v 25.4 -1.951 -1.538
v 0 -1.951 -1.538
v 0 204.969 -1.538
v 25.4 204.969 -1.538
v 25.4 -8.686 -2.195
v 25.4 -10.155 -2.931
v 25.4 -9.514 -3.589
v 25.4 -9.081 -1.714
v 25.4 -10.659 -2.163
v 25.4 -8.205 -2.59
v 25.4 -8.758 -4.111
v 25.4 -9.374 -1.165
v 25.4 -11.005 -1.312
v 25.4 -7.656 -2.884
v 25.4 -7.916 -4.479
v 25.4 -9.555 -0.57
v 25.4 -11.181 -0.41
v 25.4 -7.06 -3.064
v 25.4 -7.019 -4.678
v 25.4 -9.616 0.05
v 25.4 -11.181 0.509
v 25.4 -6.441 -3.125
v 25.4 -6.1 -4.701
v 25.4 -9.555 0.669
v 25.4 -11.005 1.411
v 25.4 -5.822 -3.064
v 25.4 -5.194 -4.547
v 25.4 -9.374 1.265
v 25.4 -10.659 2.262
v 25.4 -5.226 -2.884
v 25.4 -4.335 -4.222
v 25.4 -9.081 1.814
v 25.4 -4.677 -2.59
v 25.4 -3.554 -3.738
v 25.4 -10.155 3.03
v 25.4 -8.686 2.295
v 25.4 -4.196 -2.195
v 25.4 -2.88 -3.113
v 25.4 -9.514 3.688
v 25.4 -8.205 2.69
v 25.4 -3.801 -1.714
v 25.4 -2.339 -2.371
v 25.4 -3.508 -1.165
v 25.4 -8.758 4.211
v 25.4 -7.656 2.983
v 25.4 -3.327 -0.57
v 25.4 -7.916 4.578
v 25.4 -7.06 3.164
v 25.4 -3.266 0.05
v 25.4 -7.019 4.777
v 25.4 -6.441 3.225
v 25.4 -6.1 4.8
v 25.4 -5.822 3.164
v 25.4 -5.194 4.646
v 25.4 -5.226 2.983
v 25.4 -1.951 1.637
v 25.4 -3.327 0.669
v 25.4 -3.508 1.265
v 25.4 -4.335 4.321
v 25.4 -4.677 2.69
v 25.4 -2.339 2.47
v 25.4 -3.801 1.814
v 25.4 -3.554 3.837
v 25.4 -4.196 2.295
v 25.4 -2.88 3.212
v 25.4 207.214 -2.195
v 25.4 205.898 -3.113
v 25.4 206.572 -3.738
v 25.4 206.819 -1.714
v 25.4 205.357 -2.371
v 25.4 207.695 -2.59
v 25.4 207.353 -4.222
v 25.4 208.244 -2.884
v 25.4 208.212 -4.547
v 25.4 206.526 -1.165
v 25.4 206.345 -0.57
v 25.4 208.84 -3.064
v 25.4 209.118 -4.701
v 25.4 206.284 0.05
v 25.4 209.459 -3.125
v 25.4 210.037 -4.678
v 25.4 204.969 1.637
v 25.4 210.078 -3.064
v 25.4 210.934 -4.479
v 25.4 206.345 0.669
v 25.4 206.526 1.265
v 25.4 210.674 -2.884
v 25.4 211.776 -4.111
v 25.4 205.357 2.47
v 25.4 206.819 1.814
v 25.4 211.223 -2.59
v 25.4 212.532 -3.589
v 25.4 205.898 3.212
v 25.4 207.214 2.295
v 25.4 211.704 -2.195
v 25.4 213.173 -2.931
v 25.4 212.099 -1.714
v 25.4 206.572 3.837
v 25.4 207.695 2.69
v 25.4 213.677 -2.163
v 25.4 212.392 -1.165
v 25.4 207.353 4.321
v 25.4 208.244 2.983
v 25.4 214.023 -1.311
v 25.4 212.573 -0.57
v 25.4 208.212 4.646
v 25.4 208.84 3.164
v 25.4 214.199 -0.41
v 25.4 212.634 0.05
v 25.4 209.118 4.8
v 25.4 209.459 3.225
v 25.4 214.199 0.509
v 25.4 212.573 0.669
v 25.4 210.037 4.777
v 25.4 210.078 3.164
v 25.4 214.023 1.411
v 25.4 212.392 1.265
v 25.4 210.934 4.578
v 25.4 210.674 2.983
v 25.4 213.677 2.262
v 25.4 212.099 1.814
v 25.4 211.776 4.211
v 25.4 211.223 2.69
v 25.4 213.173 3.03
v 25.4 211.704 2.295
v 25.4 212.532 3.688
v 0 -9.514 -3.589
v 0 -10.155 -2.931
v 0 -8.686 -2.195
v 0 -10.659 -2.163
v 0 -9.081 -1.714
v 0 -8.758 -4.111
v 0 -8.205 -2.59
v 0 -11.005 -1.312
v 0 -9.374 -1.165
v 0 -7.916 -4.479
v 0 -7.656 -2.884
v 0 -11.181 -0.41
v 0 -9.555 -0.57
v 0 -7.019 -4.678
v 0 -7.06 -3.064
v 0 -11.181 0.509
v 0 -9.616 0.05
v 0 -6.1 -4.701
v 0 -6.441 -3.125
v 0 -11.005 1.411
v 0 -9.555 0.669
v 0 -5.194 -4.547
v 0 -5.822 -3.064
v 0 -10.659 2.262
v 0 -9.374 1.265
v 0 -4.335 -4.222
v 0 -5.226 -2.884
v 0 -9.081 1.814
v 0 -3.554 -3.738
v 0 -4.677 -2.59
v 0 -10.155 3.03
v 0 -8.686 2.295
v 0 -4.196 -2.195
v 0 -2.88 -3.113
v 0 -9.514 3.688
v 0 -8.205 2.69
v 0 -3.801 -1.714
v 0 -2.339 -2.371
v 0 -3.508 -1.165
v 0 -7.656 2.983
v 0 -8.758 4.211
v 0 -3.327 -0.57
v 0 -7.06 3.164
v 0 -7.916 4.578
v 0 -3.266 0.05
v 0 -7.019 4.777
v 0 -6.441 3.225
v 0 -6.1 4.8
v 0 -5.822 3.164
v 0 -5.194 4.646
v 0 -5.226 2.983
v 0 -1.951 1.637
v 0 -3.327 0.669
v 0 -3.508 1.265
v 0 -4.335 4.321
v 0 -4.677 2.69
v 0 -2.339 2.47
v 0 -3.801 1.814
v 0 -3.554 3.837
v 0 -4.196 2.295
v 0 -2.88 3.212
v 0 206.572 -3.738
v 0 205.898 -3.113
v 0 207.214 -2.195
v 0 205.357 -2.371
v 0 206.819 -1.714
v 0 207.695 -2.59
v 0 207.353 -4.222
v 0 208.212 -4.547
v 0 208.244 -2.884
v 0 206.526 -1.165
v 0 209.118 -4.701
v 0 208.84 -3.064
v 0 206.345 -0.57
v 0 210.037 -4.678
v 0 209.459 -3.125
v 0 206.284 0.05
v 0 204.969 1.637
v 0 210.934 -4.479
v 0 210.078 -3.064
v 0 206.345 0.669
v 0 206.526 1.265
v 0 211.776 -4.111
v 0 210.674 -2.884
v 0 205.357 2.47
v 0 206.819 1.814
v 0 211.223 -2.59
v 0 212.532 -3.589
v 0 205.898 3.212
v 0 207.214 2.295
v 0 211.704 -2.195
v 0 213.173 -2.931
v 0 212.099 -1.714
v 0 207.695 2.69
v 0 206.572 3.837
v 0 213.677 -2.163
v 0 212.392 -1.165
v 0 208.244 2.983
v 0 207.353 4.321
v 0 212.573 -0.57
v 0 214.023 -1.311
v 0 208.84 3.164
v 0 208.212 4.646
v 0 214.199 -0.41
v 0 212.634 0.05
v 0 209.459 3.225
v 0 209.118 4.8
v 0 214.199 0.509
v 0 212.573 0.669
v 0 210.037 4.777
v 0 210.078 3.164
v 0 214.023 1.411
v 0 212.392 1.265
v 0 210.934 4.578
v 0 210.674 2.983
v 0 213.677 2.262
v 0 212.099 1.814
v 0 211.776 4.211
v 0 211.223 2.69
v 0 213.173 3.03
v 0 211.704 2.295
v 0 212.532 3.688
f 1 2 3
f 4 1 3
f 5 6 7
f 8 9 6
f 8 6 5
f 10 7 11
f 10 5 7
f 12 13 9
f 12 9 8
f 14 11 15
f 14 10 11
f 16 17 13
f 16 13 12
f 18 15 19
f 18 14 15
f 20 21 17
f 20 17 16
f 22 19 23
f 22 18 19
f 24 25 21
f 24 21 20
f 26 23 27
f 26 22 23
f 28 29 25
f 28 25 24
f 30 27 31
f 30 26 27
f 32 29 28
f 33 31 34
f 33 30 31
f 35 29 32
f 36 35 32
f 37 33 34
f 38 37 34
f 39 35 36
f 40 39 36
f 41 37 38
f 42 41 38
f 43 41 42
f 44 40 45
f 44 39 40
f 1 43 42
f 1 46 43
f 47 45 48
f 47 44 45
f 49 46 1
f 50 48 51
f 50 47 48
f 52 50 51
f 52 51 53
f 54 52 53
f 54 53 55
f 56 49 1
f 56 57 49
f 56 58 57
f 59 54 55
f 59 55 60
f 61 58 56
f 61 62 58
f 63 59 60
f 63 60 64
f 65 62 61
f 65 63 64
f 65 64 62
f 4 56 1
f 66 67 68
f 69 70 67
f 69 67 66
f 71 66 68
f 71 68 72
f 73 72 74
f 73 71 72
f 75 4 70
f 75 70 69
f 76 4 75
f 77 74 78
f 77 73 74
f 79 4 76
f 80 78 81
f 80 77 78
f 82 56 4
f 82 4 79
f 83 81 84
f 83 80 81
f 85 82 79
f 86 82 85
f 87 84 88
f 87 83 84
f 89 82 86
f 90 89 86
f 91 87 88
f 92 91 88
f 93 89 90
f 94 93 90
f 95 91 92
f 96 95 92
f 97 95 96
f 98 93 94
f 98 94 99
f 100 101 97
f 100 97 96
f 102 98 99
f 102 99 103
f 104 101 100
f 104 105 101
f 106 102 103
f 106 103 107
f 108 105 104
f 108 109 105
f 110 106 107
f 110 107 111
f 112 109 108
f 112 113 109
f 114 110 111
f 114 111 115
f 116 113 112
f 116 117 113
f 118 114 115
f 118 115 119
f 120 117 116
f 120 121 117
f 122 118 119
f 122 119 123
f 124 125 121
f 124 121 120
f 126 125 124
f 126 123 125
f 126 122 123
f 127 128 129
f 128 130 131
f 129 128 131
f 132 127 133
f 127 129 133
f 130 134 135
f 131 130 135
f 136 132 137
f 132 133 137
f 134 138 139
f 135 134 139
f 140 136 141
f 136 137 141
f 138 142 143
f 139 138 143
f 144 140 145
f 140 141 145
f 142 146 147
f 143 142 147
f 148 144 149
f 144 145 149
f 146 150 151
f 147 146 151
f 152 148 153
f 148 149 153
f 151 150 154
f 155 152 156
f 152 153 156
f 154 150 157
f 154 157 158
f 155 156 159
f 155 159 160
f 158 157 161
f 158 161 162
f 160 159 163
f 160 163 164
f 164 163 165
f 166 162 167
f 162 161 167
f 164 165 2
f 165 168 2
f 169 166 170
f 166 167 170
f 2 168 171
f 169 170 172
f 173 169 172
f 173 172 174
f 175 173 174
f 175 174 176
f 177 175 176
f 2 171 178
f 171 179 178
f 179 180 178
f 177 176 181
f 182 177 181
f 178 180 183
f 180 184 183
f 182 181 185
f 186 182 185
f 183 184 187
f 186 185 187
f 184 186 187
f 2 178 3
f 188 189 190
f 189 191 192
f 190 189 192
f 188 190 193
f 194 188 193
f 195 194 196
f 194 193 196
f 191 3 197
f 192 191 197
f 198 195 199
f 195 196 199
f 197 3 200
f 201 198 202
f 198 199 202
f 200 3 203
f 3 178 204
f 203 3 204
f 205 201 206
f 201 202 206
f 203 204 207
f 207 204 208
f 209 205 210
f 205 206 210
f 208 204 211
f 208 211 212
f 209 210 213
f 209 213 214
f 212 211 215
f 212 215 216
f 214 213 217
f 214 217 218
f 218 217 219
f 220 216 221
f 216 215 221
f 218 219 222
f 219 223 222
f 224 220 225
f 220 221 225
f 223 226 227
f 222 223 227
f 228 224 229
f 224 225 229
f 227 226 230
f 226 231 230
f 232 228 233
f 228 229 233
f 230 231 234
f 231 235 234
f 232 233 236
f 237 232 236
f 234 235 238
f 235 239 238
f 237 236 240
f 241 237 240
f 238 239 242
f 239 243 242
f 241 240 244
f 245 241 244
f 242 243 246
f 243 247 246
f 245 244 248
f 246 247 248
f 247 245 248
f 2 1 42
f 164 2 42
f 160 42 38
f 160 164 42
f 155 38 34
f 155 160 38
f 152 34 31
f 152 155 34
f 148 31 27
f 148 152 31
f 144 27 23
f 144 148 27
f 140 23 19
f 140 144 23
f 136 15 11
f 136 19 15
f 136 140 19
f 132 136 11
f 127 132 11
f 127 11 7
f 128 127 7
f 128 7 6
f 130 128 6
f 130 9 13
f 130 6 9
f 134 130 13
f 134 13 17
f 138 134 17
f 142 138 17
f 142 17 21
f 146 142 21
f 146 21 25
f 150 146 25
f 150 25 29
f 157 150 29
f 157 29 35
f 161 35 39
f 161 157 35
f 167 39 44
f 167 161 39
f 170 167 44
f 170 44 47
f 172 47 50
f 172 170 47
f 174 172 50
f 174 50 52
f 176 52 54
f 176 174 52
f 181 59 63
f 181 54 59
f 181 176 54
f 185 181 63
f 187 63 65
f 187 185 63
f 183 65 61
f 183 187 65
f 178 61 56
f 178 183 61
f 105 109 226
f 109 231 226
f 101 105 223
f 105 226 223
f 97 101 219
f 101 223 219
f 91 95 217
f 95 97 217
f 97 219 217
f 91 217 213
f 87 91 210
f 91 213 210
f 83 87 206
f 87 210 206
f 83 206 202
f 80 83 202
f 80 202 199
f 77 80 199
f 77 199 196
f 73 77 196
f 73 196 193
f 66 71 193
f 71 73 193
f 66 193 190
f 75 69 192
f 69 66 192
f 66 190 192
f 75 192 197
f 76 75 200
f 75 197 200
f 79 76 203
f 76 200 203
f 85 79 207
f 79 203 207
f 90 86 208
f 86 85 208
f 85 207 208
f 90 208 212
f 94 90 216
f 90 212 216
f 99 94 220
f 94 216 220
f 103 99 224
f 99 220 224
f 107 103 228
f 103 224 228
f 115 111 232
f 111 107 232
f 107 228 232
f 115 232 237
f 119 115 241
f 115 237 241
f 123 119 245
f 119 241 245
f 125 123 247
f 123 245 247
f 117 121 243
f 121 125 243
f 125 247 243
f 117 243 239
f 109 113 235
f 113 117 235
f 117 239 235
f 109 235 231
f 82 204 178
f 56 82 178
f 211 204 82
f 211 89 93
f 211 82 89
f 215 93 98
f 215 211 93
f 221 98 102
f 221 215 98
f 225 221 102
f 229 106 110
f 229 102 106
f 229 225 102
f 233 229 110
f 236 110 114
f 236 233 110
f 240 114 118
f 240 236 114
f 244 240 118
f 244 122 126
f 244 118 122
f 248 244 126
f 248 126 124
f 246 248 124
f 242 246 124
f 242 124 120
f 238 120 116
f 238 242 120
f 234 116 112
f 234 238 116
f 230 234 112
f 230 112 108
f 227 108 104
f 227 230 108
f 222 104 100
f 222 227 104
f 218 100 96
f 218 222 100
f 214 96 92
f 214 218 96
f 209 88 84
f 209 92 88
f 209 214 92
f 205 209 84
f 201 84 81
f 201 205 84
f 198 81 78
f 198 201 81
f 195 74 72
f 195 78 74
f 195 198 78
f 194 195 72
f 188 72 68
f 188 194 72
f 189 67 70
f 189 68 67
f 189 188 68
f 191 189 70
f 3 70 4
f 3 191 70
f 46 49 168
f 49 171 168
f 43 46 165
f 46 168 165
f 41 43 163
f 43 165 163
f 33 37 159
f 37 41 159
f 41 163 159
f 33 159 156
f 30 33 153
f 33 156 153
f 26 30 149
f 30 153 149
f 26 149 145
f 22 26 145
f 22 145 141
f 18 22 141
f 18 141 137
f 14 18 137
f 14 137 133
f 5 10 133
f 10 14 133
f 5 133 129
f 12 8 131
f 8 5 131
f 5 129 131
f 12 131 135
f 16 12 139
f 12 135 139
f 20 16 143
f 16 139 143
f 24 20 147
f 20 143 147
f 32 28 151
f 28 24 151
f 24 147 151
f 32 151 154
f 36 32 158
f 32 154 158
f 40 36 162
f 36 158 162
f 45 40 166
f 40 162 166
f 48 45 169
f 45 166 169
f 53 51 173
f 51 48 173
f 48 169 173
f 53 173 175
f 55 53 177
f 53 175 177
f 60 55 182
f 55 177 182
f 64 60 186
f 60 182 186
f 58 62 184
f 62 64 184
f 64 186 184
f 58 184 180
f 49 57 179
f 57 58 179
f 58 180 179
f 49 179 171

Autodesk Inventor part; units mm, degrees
ref_plane "YZ Plane" through (0, 0, 0) normal (1, 0, 0) x (0, 1, 0)
ref_plane "XZ Plane" through (0, 0, 0) normal (0, 1, 0) x (-1, 0, 0)
ref_plane "XY Plane" through (0, 0, 0) normal (0, 0, 1) x (1, 0, 0)
sketch "Sketch1" plane through (0, 0, 0) normal (1, 0, 0) x (0, 1, 0)
  line L0 (204.9689, 1.6371) -> (-1.9508, 1.6371)
  line L1 (-1.9508, -1.5379) -> (204.9689, -1.5379)
  circle A0 centre (-6.441, 0.0496) radius 3.175
  circle A1 centre (209.459, 0.0496) radius 3.175
  arc A2 (-1.9508, 1.6371) -> (-1.9508, -1.5379) centre (-6.441, 0.0496) ccw
  arc A3 (204.9689, -1.5379) -> (204.9689, 1.6371) centre (209.459, 0.0496) ccw
  point P0 (0, 0)
  dimension "d0" = 3.175
  dimension "d2" = 6.35
  dimension "d3" = 6.35
  dimension "d4" = 1.5875
  dimension "d5" = 1.5875
  dimension "d8" = 215.9
extrude "Extrusion1" add sketch "Sketch1" along normal blind 25.4
properties part number "aimingcontrol" material "Aluminum 6061"
